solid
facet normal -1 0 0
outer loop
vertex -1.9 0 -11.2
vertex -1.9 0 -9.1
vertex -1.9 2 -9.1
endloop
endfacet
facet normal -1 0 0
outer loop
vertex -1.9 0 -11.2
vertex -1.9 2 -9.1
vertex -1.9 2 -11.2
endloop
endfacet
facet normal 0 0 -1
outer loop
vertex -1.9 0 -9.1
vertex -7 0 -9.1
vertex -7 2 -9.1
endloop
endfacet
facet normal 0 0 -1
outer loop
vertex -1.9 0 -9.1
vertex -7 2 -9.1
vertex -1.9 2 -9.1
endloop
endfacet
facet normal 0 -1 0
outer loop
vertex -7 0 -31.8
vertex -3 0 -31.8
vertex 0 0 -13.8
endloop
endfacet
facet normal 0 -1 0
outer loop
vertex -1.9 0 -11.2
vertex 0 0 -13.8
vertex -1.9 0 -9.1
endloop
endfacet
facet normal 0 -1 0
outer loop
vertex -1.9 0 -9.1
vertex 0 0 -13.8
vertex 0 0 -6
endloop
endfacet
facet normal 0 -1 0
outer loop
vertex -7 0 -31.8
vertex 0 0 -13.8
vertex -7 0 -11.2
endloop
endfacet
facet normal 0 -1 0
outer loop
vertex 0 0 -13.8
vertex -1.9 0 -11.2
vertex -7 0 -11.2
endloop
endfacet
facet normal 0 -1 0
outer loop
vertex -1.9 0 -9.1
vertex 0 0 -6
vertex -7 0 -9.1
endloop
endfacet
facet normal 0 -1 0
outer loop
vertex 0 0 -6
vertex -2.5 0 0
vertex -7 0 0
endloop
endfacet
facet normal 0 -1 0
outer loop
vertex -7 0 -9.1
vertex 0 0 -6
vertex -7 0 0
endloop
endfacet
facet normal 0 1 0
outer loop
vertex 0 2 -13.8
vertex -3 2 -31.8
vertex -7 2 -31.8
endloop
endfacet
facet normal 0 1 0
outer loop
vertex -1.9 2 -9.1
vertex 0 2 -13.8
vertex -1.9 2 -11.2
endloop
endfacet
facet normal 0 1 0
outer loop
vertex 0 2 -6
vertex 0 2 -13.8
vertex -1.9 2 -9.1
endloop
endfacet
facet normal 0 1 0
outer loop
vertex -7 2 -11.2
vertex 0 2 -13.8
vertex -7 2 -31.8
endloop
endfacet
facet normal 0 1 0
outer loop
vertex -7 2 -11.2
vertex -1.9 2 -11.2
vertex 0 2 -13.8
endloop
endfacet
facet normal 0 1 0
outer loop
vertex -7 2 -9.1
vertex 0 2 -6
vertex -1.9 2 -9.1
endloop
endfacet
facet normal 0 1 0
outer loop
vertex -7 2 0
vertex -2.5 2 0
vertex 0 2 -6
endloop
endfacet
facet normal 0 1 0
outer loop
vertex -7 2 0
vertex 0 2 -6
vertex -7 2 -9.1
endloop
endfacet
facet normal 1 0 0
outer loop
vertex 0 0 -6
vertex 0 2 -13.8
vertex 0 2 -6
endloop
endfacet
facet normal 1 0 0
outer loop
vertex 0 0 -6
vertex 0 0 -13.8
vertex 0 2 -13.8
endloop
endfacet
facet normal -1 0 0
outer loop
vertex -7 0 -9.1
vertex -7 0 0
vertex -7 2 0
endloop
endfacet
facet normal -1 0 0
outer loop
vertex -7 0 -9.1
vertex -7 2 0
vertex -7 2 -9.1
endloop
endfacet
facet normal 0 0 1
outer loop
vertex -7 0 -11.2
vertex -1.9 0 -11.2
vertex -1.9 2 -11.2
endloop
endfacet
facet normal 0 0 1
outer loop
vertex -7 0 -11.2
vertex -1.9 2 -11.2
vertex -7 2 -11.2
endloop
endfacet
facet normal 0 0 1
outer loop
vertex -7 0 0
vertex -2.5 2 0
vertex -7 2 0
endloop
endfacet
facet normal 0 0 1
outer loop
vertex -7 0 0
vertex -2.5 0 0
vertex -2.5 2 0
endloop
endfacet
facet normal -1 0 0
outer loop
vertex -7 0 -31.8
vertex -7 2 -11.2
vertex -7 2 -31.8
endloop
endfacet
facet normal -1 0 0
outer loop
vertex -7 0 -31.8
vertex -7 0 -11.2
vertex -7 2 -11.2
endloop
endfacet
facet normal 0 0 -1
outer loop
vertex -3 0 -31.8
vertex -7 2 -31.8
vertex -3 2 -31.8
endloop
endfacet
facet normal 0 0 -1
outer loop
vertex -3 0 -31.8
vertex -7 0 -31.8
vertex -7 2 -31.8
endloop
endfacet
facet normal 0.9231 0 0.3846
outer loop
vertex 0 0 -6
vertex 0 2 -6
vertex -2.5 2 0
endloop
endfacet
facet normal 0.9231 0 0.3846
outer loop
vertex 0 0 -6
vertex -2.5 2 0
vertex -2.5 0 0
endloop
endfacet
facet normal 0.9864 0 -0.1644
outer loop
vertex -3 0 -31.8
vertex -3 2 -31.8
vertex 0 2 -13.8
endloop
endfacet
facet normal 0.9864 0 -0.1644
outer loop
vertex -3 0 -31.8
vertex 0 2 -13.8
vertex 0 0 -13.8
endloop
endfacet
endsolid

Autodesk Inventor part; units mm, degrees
ref_plane "YZ Plane" through (0, 0, 0) normal (1, 0, 0) x (0, 1, 0)
ref_plane "XZ Plane" through (0, 0, 0) normal (0, 1, 0) x (-1, 0, 0)
ref_plane "XY Plane" through (0, 0, 0) normal (0, 0, 1) x (1, 0, 0)
sketch "Sketch1" plane through (0, 0, 0) normal (0, 1, 0) x (-1, 0, 0)
  line L0 (0, 0) -> (7, 0)
  line L1 (7, 0) -> (7, -31.8)
  line L2 (7, -31.8) -> (0, -31.8)
  line L3 (0, -31.8) -> (0, 0)
  line L4 (7, -9.1) -> (1.9, -9.1)
  line L5 (1.9, -9.1) -> (1.9, -11.2)
  line L6 (1.9, -11.2) -> (7, -11.2)
  line L7 (7, -11.2) -> (7, -9.1)
  point P0 (7, -11.2)
  dimension "d0" = 7
  dimension "d1" = 31.8
  dimension "d2" = 2.1
  dimension "d3" = 5.1
  dimension "d4" = 9.1
extrude "Extrusion1" add sketch "Sketch1" along normal blind 2 contours L0 L1 L4 L5 L6 L2 L3
chamfer "Chamfer1" distance 2.5 distance2 6 1 edges at (0, 1, 0) measured on face at (-4.6667, 0.6667, 0)
chamfer "Chamfer2" distance 18 distance2 3 1 edges at (0, 1, -31.8) measured on face at (0, 0.6667, -14.6)
properties part number "Feather_0_aerofoil_frame_support_p2"
